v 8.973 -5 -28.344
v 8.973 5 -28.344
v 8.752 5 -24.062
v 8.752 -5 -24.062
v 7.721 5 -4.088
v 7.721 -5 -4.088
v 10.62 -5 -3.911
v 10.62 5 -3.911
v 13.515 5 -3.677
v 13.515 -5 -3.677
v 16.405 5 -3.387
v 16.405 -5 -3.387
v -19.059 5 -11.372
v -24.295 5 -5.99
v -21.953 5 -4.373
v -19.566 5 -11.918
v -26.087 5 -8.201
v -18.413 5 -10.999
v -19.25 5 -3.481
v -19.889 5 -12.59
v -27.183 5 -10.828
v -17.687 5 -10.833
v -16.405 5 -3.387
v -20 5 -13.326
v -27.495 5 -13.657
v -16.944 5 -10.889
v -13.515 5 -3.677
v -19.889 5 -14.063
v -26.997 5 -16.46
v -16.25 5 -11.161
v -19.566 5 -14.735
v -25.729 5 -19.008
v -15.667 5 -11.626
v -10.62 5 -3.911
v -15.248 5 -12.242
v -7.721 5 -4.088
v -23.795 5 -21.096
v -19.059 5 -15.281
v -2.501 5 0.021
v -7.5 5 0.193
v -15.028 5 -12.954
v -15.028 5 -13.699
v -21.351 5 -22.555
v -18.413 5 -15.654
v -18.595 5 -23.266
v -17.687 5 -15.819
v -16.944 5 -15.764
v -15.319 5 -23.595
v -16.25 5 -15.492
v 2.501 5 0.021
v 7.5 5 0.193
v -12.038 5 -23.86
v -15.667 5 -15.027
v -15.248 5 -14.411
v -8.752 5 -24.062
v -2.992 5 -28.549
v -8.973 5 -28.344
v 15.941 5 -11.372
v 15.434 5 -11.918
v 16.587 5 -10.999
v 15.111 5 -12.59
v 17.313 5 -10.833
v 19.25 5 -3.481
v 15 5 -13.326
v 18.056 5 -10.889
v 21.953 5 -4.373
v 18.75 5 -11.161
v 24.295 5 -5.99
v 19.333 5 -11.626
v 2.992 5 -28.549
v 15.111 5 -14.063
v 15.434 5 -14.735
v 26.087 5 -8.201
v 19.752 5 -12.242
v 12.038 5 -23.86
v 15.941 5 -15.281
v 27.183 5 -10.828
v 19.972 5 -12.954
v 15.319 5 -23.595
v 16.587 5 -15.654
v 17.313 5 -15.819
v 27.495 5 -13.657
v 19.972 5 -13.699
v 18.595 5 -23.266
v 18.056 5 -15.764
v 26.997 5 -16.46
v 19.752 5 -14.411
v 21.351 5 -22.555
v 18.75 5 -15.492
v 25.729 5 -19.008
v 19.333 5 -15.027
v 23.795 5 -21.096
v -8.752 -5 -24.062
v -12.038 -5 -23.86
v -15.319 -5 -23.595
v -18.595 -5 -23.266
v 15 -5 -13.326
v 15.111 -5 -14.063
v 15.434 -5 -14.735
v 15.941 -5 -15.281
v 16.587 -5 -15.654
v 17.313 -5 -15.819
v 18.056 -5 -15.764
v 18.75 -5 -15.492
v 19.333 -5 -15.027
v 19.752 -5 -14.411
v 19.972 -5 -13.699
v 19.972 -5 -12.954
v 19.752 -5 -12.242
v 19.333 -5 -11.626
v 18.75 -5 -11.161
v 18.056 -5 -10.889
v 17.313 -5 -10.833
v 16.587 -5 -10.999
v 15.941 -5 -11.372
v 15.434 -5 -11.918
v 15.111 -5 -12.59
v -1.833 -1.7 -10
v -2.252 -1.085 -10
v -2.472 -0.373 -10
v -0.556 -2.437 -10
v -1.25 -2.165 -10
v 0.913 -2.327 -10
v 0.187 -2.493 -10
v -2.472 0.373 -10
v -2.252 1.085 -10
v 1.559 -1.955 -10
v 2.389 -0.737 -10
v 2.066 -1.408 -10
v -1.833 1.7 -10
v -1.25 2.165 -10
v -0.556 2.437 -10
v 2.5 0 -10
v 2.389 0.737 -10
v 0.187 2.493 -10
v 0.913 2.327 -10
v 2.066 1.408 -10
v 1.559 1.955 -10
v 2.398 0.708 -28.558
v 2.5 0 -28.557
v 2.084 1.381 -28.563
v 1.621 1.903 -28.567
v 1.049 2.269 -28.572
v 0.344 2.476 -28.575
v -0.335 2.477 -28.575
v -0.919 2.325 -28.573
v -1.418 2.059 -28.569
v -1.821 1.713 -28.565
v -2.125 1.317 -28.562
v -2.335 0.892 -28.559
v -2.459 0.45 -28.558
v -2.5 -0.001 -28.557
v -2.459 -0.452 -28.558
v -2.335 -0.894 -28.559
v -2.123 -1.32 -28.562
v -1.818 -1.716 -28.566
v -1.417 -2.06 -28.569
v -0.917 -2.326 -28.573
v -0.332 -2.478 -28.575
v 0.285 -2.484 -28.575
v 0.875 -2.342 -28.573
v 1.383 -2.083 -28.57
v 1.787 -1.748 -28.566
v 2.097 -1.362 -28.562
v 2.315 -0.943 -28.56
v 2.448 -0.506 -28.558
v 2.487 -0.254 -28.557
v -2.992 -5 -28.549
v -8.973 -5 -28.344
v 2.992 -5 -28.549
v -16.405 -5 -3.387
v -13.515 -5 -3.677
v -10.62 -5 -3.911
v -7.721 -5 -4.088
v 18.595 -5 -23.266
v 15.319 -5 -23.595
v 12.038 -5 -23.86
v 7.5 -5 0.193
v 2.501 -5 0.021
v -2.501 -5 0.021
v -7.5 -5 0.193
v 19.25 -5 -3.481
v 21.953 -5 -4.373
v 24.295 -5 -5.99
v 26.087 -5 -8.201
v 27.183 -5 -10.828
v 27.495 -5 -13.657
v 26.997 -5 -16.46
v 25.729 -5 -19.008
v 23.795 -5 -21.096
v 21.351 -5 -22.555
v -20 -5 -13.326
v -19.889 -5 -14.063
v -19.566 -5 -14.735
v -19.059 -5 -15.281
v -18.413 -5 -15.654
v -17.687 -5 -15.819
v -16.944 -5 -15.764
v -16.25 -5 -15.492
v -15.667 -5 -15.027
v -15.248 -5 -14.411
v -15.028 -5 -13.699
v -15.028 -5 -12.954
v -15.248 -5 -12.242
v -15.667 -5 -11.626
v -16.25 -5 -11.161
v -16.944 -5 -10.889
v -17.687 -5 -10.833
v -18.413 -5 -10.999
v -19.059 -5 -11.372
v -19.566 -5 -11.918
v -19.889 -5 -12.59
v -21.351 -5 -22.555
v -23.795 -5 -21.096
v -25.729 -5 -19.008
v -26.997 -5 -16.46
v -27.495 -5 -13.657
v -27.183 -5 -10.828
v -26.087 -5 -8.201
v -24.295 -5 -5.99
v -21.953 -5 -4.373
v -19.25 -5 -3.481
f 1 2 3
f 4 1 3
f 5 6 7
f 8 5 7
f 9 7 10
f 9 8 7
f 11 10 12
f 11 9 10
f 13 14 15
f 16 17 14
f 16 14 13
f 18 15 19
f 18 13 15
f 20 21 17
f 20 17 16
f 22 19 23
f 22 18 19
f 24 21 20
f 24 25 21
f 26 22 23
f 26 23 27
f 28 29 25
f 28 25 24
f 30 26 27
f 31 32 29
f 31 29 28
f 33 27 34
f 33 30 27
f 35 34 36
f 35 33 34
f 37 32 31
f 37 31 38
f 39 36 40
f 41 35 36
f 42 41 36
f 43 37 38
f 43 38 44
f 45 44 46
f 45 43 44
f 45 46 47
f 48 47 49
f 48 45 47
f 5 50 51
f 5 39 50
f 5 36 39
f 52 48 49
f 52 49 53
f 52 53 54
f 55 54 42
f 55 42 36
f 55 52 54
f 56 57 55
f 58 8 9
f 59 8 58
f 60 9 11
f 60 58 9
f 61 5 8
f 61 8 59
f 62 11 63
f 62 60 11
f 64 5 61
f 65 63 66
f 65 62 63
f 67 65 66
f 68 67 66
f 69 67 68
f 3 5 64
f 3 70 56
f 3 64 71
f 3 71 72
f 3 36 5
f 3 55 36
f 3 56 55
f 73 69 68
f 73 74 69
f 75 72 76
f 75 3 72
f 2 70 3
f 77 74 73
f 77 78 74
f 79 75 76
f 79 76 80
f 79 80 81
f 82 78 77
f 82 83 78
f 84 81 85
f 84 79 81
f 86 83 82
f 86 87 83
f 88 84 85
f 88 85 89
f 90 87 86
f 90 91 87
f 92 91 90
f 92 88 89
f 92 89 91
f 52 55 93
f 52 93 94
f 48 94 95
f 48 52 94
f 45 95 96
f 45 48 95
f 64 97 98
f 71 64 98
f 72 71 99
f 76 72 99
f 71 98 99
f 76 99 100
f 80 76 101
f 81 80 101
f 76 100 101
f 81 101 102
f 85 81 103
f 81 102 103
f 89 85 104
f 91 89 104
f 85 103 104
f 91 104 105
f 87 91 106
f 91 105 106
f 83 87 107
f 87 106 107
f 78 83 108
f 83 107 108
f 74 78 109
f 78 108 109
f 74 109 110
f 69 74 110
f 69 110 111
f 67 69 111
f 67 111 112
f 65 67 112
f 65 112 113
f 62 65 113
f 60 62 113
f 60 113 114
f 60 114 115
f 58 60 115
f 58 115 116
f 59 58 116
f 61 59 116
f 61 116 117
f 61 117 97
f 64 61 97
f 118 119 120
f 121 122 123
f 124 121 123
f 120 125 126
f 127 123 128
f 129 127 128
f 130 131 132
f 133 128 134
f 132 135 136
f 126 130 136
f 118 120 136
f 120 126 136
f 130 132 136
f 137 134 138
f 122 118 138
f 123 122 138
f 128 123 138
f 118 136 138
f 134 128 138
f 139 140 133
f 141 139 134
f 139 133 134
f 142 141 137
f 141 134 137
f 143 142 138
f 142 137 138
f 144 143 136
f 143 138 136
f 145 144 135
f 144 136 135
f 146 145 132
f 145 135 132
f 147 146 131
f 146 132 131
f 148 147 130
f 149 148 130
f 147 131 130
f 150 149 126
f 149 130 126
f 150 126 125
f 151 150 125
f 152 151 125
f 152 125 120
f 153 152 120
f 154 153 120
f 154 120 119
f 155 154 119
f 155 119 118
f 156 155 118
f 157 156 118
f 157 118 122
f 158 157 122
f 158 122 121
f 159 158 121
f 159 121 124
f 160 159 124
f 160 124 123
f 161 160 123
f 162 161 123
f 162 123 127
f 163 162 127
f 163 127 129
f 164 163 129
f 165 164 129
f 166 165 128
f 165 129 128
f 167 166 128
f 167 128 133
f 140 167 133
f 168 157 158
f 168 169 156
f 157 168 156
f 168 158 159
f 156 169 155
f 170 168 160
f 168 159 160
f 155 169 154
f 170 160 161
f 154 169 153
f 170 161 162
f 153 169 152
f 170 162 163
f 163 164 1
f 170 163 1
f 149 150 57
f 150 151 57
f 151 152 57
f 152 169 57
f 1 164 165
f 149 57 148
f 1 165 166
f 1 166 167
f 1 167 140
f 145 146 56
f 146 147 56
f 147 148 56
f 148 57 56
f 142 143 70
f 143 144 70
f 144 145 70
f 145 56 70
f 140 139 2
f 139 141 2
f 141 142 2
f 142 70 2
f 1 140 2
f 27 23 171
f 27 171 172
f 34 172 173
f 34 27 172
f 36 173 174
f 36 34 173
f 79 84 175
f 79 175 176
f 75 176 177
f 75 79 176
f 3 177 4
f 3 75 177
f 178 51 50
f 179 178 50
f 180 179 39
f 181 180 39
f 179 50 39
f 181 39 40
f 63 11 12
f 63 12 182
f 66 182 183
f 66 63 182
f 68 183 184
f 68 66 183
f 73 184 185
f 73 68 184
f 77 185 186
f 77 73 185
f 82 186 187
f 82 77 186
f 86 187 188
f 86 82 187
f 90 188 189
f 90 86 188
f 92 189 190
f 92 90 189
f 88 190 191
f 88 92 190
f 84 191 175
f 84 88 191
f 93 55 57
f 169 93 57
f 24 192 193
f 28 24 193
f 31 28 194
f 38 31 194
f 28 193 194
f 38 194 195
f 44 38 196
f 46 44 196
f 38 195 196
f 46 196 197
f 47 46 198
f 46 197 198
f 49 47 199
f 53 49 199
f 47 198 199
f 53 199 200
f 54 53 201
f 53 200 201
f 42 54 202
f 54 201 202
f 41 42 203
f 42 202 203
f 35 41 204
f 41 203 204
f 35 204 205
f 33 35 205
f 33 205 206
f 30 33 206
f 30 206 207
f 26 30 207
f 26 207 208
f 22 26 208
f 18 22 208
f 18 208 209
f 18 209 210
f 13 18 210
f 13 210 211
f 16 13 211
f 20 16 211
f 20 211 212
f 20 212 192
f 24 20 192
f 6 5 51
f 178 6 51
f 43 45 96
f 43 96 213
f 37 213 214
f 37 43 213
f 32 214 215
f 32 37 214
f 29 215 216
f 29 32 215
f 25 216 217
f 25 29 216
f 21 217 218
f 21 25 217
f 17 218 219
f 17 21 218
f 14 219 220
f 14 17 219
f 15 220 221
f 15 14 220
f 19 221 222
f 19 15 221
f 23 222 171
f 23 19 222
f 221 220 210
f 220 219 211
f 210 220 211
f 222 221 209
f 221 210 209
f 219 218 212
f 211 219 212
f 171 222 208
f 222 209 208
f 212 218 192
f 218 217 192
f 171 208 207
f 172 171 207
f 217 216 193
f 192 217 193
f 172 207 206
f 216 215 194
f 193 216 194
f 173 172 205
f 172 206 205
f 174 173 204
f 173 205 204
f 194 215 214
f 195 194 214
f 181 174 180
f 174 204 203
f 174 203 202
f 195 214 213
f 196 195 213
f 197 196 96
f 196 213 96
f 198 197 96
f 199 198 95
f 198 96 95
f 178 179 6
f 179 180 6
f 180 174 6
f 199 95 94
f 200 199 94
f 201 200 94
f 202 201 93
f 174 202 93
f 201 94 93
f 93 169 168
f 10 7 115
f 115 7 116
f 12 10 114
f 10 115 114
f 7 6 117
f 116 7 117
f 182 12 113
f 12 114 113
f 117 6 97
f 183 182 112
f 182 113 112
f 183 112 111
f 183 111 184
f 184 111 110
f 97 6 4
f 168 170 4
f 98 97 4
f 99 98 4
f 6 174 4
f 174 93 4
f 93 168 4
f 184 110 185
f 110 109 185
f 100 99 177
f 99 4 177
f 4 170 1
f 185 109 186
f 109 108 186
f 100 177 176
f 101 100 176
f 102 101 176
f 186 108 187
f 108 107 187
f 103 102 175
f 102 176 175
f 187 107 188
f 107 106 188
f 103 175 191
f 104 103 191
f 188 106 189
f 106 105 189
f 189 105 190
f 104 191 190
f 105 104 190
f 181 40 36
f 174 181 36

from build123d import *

# Parameters (mm, degrees)
BOSS_EXTRUDE1_DEPTH   = 5
BOSS_EXTRUDE2_DEPTH   = 10
M6X1_0_TAPPED_HOLE1_D = 5
CUT_EXTRUDE1_START    = -10
SKETCH8_R             = 2.5
CUT_EXTRUDE1_DEPTH    = 20


with BuildPart() as part:
    # Sketch1 → Boss-Extrude1 (new, symmetric)
    with BuildSketch(Plane(origin=(0, 0, 0), x_dir=(1, 0, 0), z_dir=(0, 1, 0))):
        with BuildLine():
            Line((-7.5, -0.193392624), (-8.972672616, 28.343633506))
            ThreePointArc((-8.972672616, 28.343633506), (0, 28.575), (8.972672616, 28.343633506))
            Line((8.972672616, 28.343633506), (7.5, -0.193392624))
            ThreePointArc((7.5, -0.193392624), (0, 0), (-7.5, -0.193392624))
        make_face()
    extrude(amount=BOSS_EXTRUDE1_DEPTH, both=True)

    # Sketch2 → Boss-Extrude2 (add, through all)
    with BuildSketch(Plane(origin=(0, 5, 0), x_dir=(1, 0, 0), z_dir=(0, 1, 0))):
        with BuildLine():
            ThreePointArc((-16.404975215, 3.386598502), (0, 4.2875), (16.404975215, 3.386598502))
            ThreePointArc((16.404975215, 3.386598502), (27.439865226, 12.231438943), (18.595024785, 23.266328954))
            ThreePointArc((18.595024785, 23.266328954), (0, 24.2875), (-18.595024785, 23.266328954))
            ThreePointArc((-18.595024785, 23.266328954), (-27.439865226, 12.231438943), (-16.404975215, 3.386598502))
        make_face()
    extrude(amount=-BOSS_EXTRUDE2_DEPTH)

    # M6x1.0 Tapped Hole1 (through all)
    with Locations(Plane(origin=(0, 5, 0), x_dir=(1, 0, 0), z_dir=(0, 1, 0))):
        with Locations((-17.5, 13.326463728), (17.5, 13.326463728)):
            Hole(M6X1_0_TAPPED_HOLE1_D / 2)

    # Sketch8 → Cut-Extrude1 (cut)
    with BuildSketch(Plane.XY.offset(CUT_EXTRUDE1_START)):
        Circle(SKETCH8_R)
    extrude(amount=-CUT_EXTRUDE1_DEPTH, mode=Mode.SUBTRACT)


solid = part.part
